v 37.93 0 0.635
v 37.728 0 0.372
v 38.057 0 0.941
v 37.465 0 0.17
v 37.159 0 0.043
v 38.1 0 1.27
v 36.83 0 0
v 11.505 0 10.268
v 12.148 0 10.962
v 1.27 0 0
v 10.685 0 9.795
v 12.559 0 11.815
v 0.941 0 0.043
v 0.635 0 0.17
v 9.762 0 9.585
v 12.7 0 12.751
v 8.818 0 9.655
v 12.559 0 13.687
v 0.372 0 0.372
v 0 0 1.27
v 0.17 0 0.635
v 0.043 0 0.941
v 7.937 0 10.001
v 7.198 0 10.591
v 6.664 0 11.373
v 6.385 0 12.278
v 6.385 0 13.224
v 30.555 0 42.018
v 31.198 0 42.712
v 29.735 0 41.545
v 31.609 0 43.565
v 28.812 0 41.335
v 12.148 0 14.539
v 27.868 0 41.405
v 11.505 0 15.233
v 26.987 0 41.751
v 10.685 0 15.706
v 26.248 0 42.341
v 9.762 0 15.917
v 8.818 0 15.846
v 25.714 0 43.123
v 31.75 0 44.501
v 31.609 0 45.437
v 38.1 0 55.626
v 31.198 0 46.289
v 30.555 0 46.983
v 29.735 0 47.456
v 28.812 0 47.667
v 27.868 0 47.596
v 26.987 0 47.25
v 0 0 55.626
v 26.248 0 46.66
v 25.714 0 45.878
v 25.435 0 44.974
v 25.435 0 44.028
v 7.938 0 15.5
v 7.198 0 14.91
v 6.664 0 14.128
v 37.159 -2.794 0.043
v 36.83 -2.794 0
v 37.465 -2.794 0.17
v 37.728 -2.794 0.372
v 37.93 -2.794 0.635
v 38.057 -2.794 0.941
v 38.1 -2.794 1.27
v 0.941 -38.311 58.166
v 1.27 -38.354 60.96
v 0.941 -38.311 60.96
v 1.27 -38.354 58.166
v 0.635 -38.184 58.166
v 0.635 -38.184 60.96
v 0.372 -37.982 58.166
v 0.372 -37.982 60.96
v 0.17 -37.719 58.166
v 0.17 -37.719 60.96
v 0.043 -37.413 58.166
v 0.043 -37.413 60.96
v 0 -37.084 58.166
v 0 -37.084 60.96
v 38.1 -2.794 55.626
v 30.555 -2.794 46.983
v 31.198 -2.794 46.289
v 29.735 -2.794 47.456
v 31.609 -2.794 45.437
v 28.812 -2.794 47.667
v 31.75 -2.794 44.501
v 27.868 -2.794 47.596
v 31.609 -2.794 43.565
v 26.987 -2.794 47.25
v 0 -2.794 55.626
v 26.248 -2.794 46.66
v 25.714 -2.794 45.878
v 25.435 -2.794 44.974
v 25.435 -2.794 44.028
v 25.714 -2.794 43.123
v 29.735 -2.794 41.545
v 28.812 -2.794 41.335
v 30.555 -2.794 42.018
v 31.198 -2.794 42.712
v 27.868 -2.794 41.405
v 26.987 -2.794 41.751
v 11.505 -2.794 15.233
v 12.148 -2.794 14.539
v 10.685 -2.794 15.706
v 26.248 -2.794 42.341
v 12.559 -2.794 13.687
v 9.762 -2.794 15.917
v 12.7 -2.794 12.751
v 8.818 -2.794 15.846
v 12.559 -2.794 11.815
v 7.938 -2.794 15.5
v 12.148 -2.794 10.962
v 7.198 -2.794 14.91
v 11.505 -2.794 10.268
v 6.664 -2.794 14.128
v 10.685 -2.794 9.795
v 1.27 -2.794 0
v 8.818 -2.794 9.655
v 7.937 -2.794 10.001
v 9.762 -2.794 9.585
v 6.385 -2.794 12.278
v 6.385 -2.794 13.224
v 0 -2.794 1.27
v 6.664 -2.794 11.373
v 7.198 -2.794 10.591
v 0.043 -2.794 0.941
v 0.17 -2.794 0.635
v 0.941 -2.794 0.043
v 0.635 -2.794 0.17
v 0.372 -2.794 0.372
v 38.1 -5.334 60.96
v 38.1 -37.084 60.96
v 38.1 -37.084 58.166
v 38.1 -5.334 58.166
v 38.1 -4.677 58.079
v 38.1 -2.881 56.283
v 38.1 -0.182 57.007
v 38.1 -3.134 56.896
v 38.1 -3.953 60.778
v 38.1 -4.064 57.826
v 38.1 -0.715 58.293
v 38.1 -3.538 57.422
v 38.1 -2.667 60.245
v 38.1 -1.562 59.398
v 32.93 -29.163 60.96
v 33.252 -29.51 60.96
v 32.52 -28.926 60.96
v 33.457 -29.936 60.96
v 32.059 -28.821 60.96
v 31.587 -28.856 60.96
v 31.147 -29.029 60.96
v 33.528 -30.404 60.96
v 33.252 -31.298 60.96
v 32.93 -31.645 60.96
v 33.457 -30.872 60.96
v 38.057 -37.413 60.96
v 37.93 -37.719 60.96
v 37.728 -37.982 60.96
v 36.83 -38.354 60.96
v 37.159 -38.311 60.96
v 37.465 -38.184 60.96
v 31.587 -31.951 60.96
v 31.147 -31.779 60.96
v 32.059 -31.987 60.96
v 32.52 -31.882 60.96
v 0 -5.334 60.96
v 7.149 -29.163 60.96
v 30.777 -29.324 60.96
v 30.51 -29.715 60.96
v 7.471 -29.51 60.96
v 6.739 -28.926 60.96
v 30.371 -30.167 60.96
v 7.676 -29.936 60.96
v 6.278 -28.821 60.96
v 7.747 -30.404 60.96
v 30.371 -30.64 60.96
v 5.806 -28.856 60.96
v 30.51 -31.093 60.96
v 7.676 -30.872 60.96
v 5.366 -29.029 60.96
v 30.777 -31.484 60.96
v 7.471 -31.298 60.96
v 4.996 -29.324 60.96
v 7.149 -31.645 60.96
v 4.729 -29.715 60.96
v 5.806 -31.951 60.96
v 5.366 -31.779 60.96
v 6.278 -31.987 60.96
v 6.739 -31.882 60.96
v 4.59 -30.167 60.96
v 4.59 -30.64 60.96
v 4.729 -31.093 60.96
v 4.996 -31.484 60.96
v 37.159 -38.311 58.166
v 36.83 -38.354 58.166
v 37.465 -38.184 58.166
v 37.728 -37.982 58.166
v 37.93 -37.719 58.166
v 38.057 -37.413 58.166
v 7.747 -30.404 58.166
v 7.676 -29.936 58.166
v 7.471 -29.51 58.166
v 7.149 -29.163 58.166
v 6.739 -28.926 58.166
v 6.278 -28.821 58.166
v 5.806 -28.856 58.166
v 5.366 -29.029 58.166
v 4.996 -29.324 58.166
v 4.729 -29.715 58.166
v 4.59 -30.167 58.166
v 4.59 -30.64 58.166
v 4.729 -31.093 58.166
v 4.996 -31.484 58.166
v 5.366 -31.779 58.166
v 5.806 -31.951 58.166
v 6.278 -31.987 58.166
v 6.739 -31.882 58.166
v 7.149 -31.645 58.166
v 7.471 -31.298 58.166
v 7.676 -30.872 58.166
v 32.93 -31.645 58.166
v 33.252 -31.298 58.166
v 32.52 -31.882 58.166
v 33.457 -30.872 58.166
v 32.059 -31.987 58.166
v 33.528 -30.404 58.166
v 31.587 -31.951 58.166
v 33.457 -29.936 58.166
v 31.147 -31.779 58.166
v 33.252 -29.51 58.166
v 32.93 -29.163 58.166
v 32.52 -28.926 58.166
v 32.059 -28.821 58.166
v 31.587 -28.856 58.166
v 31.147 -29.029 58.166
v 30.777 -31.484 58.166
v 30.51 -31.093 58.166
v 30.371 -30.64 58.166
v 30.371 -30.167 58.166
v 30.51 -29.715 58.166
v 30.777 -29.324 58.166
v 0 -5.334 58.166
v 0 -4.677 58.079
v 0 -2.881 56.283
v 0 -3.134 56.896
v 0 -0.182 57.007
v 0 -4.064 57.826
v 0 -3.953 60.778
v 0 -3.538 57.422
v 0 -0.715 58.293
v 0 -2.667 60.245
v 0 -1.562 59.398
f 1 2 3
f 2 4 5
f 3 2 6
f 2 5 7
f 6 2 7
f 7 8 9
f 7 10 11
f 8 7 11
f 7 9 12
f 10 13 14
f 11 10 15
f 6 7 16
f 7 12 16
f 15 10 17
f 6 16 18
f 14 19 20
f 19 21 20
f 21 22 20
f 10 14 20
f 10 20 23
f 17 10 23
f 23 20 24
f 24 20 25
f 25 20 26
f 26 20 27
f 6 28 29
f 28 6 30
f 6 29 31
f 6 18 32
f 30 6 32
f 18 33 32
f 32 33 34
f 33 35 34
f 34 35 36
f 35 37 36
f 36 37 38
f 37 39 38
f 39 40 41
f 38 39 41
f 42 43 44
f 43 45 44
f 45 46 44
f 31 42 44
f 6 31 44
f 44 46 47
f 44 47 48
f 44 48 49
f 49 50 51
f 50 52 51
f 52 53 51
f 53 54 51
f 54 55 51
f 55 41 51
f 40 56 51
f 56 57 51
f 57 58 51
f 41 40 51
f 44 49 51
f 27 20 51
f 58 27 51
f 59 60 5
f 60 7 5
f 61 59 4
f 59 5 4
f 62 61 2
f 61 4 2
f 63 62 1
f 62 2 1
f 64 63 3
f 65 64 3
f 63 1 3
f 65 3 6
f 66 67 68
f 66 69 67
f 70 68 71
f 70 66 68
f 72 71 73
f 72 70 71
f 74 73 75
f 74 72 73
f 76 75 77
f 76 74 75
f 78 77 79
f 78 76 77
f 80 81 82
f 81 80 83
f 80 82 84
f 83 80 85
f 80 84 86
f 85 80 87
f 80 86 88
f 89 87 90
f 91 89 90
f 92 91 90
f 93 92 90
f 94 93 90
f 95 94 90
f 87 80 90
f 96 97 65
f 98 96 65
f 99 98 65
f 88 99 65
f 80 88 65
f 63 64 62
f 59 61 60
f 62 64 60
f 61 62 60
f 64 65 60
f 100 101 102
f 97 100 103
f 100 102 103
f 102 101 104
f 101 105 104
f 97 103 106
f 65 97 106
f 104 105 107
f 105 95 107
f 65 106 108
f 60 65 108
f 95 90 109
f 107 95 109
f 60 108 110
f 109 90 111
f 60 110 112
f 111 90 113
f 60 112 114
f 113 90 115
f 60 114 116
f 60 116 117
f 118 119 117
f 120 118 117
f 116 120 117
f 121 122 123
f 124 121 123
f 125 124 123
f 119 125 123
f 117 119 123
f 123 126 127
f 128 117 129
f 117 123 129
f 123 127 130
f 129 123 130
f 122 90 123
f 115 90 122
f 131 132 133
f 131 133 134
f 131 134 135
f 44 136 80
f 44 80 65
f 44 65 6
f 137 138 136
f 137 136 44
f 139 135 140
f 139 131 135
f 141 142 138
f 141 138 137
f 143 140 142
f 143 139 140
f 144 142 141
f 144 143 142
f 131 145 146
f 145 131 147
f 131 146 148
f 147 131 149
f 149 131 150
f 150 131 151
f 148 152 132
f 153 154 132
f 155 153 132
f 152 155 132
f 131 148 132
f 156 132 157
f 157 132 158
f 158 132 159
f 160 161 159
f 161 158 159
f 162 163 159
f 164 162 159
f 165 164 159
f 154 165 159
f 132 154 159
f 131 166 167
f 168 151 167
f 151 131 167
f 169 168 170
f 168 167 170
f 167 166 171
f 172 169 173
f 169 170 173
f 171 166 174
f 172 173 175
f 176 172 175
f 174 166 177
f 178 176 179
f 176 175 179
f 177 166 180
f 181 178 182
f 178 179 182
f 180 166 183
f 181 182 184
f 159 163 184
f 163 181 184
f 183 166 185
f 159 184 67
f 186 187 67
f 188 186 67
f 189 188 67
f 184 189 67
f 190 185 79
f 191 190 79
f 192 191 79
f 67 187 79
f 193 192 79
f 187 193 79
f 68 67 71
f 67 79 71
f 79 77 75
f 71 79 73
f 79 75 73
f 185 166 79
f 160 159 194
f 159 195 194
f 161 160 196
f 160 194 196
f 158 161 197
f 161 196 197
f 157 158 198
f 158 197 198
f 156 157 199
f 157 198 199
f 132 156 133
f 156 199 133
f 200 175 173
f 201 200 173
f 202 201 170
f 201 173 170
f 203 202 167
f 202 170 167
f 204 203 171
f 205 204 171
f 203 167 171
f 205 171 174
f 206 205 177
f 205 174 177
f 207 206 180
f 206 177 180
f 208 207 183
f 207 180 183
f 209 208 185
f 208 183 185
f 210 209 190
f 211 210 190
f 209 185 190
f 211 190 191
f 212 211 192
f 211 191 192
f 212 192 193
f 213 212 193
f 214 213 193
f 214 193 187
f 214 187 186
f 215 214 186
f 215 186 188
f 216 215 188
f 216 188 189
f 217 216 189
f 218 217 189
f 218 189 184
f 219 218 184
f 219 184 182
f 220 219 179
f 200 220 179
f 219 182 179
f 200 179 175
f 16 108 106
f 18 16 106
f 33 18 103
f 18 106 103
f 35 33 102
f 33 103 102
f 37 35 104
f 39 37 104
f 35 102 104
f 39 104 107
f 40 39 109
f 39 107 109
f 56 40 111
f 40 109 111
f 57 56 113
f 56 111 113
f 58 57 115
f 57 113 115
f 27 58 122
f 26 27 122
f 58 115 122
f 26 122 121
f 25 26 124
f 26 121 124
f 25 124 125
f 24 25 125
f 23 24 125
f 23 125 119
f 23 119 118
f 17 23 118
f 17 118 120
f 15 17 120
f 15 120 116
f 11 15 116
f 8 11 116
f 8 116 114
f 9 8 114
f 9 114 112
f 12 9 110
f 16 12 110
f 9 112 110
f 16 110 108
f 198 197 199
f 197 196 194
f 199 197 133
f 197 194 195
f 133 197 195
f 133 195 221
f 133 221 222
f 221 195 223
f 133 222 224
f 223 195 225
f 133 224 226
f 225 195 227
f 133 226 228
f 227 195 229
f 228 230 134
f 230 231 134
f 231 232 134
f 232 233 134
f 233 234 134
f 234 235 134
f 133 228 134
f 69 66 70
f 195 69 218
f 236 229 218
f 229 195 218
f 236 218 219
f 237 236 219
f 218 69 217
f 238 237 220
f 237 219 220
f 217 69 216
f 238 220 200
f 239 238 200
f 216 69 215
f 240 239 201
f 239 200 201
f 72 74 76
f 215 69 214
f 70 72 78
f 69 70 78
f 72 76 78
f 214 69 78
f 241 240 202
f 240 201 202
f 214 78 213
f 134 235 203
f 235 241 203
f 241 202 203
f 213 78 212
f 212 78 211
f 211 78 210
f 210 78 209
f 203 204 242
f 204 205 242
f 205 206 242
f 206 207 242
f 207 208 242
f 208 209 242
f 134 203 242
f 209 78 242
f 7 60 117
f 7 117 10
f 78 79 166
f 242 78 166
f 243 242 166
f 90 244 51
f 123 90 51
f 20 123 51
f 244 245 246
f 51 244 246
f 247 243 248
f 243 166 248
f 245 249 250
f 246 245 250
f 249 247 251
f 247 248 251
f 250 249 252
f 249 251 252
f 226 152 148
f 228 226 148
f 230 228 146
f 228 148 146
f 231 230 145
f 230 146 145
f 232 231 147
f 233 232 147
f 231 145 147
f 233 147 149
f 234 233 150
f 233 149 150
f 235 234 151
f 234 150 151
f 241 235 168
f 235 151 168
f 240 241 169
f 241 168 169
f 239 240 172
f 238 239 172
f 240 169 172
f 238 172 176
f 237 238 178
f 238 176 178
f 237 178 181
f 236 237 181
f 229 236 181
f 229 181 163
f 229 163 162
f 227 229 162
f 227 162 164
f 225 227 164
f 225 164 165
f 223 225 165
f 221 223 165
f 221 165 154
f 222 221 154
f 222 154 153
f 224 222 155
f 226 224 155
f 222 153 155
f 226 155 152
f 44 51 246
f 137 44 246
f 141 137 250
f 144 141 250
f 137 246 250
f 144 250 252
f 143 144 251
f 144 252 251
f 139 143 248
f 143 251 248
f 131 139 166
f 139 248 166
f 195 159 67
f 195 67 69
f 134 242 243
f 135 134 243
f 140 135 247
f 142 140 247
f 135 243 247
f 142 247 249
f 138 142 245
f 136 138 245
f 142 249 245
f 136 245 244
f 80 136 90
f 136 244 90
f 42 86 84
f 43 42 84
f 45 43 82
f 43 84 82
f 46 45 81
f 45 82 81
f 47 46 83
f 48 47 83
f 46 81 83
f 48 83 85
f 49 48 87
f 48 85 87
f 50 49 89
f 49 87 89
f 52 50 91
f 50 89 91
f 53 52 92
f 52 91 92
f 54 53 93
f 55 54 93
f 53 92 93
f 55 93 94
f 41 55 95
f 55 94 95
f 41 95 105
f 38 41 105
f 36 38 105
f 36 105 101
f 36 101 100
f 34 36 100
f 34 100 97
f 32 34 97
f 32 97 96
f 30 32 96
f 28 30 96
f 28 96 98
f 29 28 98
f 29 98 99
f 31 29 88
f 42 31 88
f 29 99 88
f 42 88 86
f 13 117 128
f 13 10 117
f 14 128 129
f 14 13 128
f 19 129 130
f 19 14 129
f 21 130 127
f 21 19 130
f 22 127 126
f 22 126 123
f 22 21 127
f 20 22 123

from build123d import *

# Parameters (mm, degrees)
F1_DEPTH = 38.1
F2_R     = 1.27
F3_R     = 1.5875
F4_DEPTH = 2.794
F5_R     = 3.175
F6_DEPTH = 2.794


with BuildPart() as f1:
    # F0 (on Right) → F1 (new body)
    with BuildSketch(Plane.YZ):
        with BuildLine():
            Line((-2.794, 0), (0, 0))
            Line((0, 0), (0, 55.626))
            ThreePointArc((0, 55.626), (-1.562292, 59.397708), (-5.334, 60.96))
            Line((-5.334, 60.96), (-38.354, 60.96))
            Line((-38.354, 60.96), (-38.354, 58.166))
            Line((-38.354, 58.166), (-5.334, 58.166))
            ThreePointArc((-5.334, 58.166), (-3.537949, 57.422051), (-2.794, 55.626))
            Line((-2.794, 55.626), (-2.794, 0))
        make_face()
    extrude(amount=F1_DEPTH)

    # F2
    f2_edges = [f1.edges().sort_by_distance(p)[0] for p in [
        (0, -38.354, 59.563),
        (38.1, -38.354, 59.563),
        (38.1, -1.397, 0),
        (0, -1.397, 0),
    ]]
    fillet(f2_edges, radius=F2_R)

    # F3 (on face) → F4 (cut, through all)
    with BuildSketch(Plane.XY.offset(60.96)):
        with Locations((31.9405, -30.4038)):
            Circle(F3_R)
        with Locations((6.1595, -30.4038)):
            Circle(F3_R)
    extrude(amount=-F4_DEPTH, mode=Mode.SUBTRACT)

    # F5 (on face) → F6 (cut, through all)
    with BuildSketch(Plane.XZ.offset(2.794)):
        with Locations((28.575, 44.5008)):
            Circle(F5_R)
        with Locations((9.525, 12.7508)):
            Circle(F5_R)
    extrude(amount=-F6_DEPTH, mode=Mode.SUBTRACT)


solid = f1.part
